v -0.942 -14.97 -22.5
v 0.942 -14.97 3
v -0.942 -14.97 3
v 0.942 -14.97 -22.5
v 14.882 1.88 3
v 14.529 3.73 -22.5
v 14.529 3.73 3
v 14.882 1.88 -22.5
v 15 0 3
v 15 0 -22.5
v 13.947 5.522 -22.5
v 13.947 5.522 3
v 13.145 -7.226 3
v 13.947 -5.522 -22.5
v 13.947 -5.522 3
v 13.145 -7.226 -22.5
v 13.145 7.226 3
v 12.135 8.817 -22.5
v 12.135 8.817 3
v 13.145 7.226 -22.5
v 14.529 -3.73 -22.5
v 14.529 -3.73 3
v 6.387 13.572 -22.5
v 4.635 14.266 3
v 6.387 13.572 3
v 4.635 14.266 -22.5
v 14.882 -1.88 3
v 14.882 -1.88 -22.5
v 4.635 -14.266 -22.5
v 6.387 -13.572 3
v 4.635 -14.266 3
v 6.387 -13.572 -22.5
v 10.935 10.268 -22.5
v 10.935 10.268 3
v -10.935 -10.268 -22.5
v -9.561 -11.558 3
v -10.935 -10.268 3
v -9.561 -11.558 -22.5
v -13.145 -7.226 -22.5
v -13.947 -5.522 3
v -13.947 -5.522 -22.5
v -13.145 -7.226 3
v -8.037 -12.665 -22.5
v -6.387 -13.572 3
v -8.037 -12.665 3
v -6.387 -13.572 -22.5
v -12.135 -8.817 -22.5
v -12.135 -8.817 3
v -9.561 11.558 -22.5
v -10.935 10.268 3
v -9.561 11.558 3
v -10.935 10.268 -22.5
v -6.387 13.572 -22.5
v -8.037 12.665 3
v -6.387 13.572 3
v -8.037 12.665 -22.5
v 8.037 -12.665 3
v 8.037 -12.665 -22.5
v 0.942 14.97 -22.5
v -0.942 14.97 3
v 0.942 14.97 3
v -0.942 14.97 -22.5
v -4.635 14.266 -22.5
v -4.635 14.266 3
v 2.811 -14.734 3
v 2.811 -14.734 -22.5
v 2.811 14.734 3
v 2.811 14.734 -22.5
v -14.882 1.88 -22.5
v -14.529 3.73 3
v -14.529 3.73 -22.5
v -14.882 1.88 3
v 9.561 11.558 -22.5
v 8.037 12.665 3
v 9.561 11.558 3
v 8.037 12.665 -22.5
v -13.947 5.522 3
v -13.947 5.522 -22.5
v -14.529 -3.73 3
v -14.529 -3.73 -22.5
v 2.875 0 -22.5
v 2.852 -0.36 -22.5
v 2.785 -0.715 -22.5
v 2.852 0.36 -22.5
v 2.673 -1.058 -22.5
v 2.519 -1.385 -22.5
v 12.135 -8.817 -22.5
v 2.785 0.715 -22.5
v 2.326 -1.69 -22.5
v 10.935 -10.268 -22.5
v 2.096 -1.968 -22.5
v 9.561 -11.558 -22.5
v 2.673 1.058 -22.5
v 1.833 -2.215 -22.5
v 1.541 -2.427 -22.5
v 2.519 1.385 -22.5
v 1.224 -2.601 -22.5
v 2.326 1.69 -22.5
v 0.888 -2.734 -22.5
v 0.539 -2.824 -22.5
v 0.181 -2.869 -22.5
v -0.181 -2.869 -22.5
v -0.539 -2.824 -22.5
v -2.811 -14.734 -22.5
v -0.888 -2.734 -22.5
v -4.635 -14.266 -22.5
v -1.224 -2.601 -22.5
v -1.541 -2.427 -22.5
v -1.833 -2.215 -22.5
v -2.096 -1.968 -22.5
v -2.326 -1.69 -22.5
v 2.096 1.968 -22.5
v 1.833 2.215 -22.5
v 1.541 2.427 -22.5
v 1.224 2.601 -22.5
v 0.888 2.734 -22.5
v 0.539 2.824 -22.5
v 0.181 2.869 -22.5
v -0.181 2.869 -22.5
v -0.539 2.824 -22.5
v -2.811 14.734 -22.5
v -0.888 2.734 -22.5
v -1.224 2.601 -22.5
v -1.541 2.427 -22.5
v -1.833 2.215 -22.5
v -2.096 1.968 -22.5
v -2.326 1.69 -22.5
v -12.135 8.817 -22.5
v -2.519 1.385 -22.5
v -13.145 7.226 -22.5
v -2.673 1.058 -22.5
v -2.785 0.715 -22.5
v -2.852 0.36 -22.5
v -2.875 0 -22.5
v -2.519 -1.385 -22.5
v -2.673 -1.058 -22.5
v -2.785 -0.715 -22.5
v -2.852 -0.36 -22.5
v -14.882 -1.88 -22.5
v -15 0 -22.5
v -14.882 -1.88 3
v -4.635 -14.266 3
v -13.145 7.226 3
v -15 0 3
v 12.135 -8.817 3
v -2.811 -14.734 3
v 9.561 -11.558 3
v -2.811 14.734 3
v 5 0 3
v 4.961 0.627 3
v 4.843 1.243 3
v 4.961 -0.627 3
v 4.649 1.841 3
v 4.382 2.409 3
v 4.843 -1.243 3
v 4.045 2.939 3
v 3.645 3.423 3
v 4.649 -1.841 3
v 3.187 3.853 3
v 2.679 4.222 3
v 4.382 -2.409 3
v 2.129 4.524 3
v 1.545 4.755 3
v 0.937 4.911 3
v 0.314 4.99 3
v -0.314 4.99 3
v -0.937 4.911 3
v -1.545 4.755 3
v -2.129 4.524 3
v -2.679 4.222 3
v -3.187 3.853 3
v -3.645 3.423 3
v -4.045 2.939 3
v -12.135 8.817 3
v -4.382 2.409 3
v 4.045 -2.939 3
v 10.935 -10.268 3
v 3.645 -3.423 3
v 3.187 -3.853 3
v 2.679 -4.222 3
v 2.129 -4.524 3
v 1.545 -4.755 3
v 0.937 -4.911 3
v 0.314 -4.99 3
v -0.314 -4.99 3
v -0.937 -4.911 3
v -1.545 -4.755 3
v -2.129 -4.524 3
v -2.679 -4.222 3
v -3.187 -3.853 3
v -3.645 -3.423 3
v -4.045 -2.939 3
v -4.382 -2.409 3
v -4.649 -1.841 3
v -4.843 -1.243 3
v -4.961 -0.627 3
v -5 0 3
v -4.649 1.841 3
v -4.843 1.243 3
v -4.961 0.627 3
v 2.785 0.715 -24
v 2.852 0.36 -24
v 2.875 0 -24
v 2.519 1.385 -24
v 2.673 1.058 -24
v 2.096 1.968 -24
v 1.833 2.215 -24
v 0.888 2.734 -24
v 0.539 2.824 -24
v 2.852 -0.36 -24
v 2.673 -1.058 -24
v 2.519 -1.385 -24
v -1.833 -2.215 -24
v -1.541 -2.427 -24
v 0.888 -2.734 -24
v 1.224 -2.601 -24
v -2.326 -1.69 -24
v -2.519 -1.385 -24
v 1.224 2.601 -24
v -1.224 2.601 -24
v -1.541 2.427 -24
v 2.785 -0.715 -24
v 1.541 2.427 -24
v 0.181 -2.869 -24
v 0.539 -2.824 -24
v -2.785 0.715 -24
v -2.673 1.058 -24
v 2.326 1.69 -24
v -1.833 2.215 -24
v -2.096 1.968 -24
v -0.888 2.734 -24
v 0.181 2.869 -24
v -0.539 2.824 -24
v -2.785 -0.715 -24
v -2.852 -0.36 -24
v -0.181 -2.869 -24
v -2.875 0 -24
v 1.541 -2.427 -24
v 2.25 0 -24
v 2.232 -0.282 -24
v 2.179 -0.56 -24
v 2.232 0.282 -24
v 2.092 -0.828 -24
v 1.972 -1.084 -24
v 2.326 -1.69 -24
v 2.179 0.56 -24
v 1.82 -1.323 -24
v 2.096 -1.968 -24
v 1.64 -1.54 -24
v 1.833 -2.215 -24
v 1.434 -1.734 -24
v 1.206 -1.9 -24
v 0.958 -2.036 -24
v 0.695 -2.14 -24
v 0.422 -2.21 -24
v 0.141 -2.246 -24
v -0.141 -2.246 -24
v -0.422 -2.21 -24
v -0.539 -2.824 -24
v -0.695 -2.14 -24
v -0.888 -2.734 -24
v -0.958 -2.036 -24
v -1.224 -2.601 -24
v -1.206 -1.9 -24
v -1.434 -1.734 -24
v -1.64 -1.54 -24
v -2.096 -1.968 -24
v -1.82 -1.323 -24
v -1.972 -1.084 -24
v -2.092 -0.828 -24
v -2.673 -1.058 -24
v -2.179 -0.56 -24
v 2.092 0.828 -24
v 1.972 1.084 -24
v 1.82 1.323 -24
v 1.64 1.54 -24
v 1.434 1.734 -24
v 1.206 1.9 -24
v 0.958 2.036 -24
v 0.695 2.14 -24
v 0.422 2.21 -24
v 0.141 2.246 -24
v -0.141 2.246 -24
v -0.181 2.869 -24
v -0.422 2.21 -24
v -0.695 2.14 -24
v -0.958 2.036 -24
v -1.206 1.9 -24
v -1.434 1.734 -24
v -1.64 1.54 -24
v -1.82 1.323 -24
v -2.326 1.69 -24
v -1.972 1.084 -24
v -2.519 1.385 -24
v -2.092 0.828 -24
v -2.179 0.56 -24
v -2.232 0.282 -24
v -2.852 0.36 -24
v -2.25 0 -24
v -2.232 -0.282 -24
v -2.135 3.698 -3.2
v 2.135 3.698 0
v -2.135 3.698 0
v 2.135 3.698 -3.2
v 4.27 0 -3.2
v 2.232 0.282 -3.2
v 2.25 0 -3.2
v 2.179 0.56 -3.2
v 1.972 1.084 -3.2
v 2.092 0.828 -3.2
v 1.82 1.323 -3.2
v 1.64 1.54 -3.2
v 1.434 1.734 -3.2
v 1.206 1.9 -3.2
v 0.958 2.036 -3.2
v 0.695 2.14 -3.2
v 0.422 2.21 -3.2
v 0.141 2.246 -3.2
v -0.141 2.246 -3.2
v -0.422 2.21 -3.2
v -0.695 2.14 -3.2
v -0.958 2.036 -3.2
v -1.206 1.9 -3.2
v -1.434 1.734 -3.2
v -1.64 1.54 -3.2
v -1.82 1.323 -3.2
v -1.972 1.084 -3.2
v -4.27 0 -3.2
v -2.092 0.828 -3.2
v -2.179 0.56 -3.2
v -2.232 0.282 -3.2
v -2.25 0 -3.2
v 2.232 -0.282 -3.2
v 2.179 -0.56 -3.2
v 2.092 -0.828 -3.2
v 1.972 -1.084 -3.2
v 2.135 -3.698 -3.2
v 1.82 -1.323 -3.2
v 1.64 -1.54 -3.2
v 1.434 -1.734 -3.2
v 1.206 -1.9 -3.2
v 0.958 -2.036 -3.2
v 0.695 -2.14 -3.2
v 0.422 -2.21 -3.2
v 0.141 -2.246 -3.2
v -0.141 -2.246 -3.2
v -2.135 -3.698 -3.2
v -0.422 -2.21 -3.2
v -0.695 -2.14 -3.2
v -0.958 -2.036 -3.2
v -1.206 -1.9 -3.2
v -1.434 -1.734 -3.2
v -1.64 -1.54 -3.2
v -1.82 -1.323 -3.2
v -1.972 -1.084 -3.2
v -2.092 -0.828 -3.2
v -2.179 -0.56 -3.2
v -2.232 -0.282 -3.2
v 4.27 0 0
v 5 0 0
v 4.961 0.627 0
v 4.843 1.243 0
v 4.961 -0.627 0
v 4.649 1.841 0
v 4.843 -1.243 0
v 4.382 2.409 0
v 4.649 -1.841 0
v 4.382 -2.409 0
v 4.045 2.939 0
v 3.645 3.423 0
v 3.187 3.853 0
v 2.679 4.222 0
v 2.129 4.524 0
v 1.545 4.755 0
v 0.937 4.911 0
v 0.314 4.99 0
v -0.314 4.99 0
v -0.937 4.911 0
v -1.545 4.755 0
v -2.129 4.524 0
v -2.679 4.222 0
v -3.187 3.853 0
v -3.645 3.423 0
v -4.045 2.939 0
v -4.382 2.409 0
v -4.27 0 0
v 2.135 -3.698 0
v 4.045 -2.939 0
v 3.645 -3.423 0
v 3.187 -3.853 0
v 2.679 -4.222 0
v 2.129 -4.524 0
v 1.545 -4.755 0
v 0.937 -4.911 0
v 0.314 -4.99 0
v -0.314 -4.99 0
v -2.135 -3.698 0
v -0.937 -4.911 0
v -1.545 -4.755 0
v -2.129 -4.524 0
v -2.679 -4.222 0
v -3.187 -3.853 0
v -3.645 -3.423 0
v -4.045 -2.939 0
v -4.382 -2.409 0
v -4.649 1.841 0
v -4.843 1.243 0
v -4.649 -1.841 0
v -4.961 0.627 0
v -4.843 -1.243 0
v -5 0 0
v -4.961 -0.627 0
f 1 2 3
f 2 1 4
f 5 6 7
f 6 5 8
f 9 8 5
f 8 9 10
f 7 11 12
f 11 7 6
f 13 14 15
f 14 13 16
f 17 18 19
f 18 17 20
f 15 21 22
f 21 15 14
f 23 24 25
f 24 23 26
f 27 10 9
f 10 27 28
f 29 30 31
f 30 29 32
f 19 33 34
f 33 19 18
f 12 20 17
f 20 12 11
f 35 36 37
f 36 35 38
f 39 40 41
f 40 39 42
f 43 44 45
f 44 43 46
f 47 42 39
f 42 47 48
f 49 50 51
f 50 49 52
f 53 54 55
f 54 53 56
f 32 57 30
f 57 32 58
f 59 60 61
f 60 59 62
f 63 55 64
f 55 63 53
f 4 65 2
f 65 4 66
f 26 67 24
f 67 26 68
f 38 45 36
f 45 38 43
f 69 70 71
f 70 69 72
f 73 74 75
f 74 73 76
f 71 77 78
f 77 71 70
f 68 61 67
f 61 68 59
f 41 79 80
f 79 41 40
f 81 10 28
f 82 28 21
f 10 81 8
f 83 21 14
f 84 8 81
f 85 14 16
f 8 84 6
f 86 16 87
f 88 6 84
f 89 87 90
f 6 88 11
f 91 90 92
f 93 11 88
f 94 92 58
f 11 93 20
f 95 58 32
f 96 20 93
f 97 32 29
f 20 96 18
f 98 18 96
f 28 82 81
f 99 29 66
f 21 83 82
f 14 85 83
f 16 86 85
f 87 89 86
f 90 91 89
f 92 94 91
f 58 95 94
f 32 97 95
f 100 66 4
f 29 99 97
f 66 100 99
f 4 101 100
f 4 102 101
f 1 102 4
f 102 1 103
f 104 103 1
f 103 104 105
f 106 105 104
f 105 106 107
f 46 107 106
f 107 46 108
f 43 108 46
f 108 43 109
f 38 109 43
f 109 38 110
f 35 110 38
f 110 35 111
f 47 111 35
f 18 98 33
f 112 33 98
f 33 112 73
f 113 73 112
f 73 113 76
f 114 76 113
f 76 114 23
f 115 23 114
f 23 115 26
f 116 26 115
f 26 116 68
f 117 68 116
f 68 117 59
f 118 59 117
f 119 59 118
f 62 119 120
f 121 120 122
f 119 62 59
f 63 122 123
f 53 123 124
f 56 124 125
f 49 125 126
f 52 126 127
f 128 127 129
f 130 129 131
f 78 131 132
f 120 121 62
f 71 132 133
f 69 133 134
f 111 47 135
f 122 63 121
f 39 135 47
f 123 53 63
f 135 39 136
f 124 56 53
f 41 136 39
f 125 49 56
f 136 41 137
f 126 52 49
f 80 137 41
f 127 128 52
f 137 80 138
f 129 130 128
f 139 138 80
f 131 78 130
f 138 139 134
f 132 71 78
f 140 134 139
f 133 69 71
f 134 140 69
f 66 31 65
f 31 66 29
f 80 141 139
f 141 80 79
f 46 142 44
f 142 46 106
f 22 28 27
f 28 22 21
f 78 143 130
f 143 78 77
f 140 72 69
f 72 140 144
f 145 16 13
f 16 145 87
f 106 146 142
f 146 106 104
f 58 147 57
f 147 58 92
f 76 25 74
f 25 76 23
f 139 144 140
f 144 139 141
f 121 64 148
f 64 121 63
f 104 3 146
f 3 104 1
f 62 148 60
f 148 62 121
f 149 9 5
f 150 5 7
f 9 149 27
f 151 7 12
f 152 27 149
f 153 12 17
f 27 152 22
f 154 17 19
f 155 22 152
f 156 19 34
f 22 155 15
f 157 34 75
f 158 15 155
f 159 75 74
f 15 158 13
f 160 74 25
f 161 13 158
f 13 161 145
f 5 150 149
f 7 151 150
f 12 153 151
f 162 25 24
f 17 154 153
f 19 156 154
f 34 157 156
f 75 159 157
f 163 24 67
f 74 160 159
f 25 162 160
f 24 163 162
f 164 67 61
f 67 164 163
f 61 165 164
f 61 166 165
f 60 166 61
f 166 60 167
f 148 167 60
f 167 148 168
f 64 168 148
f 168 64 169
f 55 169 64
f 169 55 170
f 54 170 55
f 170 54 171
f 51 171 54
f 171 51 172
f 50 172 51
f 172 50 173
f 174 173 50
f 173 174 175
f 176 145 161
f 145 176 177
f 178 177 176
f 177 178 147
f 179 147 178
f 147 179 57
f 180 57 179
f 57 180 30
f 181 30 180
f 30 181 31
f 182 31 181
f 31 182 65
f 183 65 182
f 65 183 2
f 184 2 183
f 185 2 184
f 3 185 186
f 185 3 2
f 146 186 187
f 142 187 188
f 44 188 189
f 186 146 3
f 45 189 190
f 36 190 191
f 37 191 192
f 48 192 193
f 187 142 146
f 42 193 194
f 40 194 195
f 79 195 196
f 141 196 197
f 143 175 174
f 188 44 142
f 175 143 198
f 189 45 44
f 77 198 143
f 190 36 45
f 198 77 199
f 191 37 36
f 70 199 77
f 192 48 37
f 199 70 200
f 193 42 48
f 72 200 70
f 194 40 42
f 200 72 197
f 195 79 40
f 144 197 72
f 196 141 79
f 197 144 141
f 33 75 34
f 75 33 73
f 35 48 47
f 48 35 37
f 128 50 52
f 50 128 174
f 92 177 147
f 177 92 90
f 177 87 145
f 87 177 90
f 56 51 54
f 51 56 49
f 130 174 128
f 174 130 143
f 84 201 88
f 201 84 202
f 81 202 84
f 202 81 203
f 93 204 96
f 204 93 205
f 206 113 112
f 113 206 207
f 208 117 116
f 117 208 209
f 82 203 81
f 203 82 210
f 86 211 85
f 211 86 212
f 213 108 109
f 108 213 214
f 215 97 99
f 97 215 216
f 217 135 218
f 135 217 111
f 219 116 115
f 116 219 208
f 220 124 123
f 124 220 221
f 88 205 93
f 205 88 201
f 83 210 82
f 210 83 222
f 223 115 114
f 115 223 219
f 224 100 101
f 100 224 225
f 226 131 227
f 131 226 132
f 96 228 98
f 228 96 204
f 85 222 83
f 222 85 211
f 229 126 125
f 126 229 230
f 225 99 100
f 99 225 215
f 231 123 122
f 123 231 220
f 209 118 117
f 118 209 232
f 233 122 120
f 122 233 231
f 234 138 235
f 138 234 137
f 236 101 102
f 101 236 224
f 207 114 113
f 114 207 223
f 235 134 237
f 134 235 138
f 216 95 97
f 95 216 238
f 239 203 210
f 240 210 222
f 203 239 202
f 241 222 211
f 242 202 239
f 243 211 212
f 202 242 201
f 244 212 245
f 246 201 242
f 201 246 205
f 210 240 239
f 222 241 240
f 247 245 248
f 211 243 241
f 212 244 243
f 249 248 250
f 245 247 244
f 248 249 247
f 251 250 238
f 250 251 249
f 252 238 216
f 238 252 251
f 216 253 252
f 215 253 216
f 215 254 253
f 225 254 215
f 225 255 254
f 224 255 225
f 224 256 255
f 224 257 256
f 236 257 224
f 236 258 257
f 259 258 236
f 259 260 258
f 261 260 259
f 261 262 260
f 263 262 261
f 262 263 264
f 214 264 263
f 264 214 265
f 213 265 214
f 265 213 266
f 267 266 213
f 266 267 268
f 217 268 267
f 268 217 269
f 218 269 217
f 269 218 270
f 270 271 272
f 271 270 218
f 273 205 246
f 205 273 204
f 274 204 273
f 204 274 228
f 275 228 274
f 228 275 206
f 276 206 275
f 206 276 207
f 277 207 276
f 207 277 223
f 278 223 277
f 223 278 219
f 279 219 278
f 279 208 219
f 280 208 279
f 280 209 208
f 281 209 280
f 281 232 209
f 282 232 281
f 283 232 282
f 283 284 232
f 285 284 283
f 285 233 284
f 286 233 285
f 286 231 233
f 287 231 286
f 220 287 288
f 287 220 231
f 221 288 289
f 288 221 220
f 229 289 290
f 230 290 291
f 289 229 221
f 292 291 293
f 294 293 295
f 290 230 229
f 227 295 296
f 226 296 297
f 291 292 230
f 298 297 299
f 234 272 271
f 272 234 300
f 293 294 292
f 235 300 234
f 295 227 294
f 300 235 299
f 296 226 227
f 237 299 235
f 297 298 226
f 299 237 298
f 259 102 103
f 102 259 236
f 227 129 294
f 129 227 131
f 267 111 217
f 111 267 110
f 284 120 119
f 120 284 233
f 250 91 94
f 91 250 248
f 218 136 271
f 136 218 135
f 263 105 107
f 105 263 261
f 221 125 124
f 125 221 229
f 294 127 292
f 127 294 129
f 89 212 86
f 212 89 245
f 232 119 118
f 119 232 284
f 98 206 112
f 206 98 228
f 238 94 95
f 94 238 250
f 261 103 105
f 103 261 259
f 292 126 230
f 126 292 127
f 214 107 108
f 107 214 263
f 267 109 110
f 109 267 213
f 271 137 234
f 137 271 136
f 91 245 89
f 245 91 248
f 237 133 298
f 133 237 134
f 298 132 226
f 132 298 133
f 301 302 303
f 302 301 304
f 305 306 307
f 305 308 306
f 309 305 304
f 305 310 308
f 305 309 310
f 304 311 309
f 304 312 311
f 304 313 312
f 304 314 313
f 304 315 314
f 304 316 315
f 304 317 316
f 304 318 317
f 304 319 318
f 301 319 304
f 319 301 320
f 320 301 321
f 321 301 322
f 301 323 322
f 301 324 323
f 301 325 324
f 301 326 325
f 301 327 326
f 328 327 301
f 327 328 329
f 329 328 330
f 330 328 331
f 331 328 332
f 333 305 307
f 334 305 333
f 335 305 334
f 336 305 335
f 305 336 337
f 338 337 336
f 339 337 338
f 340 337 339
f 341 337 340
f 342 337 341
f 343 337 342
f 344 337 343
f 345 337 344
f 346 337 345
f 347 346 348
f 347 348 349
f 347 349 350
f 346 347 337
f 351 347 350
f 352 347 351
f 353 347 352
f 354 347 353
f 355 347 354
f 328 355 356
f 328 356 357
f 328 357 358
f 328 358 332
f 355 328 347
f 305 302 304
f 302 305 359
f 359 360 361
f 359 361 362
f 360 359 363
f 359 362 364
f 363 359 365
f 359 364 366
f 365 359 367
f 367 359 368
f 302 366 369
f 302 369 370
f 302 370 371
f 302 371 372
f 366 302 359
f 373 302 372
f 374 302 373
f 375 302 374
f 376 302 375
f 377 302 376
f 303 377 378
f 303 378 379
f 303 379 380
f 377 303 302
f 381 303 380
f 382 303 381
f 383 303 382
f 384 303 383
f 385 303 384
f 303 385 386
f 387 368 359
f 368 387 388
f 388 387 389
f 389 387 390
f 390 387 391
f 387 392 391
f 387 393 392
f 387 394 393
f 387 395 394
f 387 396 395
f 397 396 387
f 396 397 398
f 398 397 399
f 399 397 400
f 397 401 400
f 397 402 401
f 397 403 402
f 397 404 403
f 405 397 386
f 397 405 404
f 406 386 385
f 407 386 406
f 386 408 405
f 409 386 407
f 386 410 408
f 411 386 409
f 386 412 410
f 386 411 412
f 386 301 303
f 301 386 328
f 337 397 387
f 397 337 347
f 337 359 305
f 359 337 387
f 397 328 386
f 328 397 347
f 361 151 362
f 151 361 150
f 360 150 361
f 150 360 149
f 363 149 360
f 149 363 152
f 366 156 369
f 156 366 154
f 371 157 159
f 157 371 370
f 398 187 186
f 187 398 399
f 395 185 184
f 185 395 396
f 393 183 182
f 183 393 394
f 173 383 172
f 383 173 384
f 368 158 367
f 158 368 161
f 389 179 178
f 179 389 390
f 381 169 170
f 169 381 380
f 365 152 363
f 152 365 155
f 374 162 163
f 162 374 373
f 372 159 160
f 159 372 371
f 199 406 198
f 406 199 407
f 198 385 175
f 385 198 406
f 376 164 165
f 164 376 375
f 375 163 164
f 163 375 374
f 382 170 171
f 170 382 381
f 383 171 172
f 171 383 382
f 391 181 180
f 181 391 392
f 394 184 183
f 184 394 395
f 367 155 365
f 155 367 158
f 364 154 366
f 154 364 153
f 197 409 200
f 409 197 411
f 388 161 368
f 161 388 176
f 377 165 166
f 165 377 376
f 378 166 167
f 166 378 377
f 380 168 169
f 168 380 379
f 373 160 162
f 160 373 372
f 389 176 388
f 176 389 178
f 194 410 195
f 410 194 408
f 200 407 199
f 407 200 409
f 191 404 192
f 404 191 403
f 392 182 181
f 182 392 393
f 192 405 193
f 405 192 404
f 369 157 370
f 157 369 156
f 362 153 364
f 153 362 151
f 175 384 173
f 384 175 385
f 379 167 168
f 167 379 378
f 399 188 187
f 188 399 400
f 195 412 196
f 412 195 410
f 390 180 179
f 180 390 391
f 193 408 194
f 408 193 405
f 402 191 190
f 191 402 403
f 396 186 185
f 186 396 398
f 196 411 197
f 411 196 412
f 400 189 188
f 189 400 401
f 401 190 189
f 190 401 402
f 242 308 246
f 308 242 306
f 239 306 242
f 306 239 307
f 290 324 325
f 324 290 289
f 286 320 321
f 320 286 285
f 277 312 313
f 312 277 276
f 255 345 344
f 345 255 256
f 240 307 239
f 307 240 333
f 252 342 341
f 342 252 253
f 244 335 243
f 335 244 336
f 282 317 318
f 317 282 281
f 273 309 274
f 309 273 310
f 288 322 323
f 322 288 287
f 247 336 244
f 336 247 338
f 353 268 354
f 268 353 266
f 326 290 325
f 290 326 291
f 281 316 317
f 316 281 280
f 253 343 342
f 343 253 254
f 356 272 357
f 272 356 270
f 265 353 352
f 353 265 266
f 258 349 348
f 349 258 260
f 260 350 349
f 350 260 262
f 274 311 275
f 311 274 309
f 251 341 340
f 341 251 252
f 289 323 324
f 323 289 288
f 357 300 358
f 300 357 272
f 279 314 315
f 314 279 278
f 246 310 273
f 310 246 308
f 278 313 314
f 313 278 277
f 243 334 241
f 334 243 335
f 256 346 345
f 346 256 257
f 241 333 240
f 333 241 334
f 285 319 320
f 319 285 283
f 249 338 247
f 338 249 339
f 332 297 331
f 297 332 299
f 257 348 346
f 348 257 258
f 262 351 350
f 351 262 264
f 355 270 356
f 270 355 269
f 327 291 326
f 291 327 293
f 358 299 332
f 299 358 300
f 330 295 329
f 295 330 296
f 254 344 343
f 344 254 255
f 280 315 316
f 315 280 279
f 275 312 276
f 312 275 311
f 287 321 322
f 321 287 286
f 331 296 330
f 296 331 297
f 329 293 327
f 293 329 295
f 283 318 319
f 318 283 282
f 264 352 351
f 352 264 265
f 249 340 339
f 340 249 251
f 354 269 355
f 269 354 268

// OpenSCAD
$fn = 50;


difference() {
	union() {
		translate(v = [0, 0, -22.5000000000]) {
			cylinder(h = 25.5000000000, r = 15.0000000000);
		}
		#translate(v = [0, 0, -24.0000000000]) {
			cylinder(h = 24, r = 2.8750000000);
		}
	}
	union() {
		translate(v = [0, 0, 0]) {
			rotate(a = [0, 0, 0]) {
				difference() {
					union() {
						translate(v = [0, 0, -3.2000000000]) {
							linear_extrude(height = 3.2000000000) {
								polygon(points = [[4.2698000000, 0.0000000000], [2.1349000000, 3.6977552691], [-2.1349000000, 3.6977552691], [-4.2698000000, 0.0000000000], [-2.1349000000, -3.6977552691], [2.1349000000, -3.6977552691]]);
							}
						}
					}
					union();
				}
			}
		}
		#cylinder(h = 3, r = 5.0000000000);
		#translate(v = [0, 0, -100.0000000000]) {
			cylinder(h = 200, r = 2.2500000000);
		}
	}
}
